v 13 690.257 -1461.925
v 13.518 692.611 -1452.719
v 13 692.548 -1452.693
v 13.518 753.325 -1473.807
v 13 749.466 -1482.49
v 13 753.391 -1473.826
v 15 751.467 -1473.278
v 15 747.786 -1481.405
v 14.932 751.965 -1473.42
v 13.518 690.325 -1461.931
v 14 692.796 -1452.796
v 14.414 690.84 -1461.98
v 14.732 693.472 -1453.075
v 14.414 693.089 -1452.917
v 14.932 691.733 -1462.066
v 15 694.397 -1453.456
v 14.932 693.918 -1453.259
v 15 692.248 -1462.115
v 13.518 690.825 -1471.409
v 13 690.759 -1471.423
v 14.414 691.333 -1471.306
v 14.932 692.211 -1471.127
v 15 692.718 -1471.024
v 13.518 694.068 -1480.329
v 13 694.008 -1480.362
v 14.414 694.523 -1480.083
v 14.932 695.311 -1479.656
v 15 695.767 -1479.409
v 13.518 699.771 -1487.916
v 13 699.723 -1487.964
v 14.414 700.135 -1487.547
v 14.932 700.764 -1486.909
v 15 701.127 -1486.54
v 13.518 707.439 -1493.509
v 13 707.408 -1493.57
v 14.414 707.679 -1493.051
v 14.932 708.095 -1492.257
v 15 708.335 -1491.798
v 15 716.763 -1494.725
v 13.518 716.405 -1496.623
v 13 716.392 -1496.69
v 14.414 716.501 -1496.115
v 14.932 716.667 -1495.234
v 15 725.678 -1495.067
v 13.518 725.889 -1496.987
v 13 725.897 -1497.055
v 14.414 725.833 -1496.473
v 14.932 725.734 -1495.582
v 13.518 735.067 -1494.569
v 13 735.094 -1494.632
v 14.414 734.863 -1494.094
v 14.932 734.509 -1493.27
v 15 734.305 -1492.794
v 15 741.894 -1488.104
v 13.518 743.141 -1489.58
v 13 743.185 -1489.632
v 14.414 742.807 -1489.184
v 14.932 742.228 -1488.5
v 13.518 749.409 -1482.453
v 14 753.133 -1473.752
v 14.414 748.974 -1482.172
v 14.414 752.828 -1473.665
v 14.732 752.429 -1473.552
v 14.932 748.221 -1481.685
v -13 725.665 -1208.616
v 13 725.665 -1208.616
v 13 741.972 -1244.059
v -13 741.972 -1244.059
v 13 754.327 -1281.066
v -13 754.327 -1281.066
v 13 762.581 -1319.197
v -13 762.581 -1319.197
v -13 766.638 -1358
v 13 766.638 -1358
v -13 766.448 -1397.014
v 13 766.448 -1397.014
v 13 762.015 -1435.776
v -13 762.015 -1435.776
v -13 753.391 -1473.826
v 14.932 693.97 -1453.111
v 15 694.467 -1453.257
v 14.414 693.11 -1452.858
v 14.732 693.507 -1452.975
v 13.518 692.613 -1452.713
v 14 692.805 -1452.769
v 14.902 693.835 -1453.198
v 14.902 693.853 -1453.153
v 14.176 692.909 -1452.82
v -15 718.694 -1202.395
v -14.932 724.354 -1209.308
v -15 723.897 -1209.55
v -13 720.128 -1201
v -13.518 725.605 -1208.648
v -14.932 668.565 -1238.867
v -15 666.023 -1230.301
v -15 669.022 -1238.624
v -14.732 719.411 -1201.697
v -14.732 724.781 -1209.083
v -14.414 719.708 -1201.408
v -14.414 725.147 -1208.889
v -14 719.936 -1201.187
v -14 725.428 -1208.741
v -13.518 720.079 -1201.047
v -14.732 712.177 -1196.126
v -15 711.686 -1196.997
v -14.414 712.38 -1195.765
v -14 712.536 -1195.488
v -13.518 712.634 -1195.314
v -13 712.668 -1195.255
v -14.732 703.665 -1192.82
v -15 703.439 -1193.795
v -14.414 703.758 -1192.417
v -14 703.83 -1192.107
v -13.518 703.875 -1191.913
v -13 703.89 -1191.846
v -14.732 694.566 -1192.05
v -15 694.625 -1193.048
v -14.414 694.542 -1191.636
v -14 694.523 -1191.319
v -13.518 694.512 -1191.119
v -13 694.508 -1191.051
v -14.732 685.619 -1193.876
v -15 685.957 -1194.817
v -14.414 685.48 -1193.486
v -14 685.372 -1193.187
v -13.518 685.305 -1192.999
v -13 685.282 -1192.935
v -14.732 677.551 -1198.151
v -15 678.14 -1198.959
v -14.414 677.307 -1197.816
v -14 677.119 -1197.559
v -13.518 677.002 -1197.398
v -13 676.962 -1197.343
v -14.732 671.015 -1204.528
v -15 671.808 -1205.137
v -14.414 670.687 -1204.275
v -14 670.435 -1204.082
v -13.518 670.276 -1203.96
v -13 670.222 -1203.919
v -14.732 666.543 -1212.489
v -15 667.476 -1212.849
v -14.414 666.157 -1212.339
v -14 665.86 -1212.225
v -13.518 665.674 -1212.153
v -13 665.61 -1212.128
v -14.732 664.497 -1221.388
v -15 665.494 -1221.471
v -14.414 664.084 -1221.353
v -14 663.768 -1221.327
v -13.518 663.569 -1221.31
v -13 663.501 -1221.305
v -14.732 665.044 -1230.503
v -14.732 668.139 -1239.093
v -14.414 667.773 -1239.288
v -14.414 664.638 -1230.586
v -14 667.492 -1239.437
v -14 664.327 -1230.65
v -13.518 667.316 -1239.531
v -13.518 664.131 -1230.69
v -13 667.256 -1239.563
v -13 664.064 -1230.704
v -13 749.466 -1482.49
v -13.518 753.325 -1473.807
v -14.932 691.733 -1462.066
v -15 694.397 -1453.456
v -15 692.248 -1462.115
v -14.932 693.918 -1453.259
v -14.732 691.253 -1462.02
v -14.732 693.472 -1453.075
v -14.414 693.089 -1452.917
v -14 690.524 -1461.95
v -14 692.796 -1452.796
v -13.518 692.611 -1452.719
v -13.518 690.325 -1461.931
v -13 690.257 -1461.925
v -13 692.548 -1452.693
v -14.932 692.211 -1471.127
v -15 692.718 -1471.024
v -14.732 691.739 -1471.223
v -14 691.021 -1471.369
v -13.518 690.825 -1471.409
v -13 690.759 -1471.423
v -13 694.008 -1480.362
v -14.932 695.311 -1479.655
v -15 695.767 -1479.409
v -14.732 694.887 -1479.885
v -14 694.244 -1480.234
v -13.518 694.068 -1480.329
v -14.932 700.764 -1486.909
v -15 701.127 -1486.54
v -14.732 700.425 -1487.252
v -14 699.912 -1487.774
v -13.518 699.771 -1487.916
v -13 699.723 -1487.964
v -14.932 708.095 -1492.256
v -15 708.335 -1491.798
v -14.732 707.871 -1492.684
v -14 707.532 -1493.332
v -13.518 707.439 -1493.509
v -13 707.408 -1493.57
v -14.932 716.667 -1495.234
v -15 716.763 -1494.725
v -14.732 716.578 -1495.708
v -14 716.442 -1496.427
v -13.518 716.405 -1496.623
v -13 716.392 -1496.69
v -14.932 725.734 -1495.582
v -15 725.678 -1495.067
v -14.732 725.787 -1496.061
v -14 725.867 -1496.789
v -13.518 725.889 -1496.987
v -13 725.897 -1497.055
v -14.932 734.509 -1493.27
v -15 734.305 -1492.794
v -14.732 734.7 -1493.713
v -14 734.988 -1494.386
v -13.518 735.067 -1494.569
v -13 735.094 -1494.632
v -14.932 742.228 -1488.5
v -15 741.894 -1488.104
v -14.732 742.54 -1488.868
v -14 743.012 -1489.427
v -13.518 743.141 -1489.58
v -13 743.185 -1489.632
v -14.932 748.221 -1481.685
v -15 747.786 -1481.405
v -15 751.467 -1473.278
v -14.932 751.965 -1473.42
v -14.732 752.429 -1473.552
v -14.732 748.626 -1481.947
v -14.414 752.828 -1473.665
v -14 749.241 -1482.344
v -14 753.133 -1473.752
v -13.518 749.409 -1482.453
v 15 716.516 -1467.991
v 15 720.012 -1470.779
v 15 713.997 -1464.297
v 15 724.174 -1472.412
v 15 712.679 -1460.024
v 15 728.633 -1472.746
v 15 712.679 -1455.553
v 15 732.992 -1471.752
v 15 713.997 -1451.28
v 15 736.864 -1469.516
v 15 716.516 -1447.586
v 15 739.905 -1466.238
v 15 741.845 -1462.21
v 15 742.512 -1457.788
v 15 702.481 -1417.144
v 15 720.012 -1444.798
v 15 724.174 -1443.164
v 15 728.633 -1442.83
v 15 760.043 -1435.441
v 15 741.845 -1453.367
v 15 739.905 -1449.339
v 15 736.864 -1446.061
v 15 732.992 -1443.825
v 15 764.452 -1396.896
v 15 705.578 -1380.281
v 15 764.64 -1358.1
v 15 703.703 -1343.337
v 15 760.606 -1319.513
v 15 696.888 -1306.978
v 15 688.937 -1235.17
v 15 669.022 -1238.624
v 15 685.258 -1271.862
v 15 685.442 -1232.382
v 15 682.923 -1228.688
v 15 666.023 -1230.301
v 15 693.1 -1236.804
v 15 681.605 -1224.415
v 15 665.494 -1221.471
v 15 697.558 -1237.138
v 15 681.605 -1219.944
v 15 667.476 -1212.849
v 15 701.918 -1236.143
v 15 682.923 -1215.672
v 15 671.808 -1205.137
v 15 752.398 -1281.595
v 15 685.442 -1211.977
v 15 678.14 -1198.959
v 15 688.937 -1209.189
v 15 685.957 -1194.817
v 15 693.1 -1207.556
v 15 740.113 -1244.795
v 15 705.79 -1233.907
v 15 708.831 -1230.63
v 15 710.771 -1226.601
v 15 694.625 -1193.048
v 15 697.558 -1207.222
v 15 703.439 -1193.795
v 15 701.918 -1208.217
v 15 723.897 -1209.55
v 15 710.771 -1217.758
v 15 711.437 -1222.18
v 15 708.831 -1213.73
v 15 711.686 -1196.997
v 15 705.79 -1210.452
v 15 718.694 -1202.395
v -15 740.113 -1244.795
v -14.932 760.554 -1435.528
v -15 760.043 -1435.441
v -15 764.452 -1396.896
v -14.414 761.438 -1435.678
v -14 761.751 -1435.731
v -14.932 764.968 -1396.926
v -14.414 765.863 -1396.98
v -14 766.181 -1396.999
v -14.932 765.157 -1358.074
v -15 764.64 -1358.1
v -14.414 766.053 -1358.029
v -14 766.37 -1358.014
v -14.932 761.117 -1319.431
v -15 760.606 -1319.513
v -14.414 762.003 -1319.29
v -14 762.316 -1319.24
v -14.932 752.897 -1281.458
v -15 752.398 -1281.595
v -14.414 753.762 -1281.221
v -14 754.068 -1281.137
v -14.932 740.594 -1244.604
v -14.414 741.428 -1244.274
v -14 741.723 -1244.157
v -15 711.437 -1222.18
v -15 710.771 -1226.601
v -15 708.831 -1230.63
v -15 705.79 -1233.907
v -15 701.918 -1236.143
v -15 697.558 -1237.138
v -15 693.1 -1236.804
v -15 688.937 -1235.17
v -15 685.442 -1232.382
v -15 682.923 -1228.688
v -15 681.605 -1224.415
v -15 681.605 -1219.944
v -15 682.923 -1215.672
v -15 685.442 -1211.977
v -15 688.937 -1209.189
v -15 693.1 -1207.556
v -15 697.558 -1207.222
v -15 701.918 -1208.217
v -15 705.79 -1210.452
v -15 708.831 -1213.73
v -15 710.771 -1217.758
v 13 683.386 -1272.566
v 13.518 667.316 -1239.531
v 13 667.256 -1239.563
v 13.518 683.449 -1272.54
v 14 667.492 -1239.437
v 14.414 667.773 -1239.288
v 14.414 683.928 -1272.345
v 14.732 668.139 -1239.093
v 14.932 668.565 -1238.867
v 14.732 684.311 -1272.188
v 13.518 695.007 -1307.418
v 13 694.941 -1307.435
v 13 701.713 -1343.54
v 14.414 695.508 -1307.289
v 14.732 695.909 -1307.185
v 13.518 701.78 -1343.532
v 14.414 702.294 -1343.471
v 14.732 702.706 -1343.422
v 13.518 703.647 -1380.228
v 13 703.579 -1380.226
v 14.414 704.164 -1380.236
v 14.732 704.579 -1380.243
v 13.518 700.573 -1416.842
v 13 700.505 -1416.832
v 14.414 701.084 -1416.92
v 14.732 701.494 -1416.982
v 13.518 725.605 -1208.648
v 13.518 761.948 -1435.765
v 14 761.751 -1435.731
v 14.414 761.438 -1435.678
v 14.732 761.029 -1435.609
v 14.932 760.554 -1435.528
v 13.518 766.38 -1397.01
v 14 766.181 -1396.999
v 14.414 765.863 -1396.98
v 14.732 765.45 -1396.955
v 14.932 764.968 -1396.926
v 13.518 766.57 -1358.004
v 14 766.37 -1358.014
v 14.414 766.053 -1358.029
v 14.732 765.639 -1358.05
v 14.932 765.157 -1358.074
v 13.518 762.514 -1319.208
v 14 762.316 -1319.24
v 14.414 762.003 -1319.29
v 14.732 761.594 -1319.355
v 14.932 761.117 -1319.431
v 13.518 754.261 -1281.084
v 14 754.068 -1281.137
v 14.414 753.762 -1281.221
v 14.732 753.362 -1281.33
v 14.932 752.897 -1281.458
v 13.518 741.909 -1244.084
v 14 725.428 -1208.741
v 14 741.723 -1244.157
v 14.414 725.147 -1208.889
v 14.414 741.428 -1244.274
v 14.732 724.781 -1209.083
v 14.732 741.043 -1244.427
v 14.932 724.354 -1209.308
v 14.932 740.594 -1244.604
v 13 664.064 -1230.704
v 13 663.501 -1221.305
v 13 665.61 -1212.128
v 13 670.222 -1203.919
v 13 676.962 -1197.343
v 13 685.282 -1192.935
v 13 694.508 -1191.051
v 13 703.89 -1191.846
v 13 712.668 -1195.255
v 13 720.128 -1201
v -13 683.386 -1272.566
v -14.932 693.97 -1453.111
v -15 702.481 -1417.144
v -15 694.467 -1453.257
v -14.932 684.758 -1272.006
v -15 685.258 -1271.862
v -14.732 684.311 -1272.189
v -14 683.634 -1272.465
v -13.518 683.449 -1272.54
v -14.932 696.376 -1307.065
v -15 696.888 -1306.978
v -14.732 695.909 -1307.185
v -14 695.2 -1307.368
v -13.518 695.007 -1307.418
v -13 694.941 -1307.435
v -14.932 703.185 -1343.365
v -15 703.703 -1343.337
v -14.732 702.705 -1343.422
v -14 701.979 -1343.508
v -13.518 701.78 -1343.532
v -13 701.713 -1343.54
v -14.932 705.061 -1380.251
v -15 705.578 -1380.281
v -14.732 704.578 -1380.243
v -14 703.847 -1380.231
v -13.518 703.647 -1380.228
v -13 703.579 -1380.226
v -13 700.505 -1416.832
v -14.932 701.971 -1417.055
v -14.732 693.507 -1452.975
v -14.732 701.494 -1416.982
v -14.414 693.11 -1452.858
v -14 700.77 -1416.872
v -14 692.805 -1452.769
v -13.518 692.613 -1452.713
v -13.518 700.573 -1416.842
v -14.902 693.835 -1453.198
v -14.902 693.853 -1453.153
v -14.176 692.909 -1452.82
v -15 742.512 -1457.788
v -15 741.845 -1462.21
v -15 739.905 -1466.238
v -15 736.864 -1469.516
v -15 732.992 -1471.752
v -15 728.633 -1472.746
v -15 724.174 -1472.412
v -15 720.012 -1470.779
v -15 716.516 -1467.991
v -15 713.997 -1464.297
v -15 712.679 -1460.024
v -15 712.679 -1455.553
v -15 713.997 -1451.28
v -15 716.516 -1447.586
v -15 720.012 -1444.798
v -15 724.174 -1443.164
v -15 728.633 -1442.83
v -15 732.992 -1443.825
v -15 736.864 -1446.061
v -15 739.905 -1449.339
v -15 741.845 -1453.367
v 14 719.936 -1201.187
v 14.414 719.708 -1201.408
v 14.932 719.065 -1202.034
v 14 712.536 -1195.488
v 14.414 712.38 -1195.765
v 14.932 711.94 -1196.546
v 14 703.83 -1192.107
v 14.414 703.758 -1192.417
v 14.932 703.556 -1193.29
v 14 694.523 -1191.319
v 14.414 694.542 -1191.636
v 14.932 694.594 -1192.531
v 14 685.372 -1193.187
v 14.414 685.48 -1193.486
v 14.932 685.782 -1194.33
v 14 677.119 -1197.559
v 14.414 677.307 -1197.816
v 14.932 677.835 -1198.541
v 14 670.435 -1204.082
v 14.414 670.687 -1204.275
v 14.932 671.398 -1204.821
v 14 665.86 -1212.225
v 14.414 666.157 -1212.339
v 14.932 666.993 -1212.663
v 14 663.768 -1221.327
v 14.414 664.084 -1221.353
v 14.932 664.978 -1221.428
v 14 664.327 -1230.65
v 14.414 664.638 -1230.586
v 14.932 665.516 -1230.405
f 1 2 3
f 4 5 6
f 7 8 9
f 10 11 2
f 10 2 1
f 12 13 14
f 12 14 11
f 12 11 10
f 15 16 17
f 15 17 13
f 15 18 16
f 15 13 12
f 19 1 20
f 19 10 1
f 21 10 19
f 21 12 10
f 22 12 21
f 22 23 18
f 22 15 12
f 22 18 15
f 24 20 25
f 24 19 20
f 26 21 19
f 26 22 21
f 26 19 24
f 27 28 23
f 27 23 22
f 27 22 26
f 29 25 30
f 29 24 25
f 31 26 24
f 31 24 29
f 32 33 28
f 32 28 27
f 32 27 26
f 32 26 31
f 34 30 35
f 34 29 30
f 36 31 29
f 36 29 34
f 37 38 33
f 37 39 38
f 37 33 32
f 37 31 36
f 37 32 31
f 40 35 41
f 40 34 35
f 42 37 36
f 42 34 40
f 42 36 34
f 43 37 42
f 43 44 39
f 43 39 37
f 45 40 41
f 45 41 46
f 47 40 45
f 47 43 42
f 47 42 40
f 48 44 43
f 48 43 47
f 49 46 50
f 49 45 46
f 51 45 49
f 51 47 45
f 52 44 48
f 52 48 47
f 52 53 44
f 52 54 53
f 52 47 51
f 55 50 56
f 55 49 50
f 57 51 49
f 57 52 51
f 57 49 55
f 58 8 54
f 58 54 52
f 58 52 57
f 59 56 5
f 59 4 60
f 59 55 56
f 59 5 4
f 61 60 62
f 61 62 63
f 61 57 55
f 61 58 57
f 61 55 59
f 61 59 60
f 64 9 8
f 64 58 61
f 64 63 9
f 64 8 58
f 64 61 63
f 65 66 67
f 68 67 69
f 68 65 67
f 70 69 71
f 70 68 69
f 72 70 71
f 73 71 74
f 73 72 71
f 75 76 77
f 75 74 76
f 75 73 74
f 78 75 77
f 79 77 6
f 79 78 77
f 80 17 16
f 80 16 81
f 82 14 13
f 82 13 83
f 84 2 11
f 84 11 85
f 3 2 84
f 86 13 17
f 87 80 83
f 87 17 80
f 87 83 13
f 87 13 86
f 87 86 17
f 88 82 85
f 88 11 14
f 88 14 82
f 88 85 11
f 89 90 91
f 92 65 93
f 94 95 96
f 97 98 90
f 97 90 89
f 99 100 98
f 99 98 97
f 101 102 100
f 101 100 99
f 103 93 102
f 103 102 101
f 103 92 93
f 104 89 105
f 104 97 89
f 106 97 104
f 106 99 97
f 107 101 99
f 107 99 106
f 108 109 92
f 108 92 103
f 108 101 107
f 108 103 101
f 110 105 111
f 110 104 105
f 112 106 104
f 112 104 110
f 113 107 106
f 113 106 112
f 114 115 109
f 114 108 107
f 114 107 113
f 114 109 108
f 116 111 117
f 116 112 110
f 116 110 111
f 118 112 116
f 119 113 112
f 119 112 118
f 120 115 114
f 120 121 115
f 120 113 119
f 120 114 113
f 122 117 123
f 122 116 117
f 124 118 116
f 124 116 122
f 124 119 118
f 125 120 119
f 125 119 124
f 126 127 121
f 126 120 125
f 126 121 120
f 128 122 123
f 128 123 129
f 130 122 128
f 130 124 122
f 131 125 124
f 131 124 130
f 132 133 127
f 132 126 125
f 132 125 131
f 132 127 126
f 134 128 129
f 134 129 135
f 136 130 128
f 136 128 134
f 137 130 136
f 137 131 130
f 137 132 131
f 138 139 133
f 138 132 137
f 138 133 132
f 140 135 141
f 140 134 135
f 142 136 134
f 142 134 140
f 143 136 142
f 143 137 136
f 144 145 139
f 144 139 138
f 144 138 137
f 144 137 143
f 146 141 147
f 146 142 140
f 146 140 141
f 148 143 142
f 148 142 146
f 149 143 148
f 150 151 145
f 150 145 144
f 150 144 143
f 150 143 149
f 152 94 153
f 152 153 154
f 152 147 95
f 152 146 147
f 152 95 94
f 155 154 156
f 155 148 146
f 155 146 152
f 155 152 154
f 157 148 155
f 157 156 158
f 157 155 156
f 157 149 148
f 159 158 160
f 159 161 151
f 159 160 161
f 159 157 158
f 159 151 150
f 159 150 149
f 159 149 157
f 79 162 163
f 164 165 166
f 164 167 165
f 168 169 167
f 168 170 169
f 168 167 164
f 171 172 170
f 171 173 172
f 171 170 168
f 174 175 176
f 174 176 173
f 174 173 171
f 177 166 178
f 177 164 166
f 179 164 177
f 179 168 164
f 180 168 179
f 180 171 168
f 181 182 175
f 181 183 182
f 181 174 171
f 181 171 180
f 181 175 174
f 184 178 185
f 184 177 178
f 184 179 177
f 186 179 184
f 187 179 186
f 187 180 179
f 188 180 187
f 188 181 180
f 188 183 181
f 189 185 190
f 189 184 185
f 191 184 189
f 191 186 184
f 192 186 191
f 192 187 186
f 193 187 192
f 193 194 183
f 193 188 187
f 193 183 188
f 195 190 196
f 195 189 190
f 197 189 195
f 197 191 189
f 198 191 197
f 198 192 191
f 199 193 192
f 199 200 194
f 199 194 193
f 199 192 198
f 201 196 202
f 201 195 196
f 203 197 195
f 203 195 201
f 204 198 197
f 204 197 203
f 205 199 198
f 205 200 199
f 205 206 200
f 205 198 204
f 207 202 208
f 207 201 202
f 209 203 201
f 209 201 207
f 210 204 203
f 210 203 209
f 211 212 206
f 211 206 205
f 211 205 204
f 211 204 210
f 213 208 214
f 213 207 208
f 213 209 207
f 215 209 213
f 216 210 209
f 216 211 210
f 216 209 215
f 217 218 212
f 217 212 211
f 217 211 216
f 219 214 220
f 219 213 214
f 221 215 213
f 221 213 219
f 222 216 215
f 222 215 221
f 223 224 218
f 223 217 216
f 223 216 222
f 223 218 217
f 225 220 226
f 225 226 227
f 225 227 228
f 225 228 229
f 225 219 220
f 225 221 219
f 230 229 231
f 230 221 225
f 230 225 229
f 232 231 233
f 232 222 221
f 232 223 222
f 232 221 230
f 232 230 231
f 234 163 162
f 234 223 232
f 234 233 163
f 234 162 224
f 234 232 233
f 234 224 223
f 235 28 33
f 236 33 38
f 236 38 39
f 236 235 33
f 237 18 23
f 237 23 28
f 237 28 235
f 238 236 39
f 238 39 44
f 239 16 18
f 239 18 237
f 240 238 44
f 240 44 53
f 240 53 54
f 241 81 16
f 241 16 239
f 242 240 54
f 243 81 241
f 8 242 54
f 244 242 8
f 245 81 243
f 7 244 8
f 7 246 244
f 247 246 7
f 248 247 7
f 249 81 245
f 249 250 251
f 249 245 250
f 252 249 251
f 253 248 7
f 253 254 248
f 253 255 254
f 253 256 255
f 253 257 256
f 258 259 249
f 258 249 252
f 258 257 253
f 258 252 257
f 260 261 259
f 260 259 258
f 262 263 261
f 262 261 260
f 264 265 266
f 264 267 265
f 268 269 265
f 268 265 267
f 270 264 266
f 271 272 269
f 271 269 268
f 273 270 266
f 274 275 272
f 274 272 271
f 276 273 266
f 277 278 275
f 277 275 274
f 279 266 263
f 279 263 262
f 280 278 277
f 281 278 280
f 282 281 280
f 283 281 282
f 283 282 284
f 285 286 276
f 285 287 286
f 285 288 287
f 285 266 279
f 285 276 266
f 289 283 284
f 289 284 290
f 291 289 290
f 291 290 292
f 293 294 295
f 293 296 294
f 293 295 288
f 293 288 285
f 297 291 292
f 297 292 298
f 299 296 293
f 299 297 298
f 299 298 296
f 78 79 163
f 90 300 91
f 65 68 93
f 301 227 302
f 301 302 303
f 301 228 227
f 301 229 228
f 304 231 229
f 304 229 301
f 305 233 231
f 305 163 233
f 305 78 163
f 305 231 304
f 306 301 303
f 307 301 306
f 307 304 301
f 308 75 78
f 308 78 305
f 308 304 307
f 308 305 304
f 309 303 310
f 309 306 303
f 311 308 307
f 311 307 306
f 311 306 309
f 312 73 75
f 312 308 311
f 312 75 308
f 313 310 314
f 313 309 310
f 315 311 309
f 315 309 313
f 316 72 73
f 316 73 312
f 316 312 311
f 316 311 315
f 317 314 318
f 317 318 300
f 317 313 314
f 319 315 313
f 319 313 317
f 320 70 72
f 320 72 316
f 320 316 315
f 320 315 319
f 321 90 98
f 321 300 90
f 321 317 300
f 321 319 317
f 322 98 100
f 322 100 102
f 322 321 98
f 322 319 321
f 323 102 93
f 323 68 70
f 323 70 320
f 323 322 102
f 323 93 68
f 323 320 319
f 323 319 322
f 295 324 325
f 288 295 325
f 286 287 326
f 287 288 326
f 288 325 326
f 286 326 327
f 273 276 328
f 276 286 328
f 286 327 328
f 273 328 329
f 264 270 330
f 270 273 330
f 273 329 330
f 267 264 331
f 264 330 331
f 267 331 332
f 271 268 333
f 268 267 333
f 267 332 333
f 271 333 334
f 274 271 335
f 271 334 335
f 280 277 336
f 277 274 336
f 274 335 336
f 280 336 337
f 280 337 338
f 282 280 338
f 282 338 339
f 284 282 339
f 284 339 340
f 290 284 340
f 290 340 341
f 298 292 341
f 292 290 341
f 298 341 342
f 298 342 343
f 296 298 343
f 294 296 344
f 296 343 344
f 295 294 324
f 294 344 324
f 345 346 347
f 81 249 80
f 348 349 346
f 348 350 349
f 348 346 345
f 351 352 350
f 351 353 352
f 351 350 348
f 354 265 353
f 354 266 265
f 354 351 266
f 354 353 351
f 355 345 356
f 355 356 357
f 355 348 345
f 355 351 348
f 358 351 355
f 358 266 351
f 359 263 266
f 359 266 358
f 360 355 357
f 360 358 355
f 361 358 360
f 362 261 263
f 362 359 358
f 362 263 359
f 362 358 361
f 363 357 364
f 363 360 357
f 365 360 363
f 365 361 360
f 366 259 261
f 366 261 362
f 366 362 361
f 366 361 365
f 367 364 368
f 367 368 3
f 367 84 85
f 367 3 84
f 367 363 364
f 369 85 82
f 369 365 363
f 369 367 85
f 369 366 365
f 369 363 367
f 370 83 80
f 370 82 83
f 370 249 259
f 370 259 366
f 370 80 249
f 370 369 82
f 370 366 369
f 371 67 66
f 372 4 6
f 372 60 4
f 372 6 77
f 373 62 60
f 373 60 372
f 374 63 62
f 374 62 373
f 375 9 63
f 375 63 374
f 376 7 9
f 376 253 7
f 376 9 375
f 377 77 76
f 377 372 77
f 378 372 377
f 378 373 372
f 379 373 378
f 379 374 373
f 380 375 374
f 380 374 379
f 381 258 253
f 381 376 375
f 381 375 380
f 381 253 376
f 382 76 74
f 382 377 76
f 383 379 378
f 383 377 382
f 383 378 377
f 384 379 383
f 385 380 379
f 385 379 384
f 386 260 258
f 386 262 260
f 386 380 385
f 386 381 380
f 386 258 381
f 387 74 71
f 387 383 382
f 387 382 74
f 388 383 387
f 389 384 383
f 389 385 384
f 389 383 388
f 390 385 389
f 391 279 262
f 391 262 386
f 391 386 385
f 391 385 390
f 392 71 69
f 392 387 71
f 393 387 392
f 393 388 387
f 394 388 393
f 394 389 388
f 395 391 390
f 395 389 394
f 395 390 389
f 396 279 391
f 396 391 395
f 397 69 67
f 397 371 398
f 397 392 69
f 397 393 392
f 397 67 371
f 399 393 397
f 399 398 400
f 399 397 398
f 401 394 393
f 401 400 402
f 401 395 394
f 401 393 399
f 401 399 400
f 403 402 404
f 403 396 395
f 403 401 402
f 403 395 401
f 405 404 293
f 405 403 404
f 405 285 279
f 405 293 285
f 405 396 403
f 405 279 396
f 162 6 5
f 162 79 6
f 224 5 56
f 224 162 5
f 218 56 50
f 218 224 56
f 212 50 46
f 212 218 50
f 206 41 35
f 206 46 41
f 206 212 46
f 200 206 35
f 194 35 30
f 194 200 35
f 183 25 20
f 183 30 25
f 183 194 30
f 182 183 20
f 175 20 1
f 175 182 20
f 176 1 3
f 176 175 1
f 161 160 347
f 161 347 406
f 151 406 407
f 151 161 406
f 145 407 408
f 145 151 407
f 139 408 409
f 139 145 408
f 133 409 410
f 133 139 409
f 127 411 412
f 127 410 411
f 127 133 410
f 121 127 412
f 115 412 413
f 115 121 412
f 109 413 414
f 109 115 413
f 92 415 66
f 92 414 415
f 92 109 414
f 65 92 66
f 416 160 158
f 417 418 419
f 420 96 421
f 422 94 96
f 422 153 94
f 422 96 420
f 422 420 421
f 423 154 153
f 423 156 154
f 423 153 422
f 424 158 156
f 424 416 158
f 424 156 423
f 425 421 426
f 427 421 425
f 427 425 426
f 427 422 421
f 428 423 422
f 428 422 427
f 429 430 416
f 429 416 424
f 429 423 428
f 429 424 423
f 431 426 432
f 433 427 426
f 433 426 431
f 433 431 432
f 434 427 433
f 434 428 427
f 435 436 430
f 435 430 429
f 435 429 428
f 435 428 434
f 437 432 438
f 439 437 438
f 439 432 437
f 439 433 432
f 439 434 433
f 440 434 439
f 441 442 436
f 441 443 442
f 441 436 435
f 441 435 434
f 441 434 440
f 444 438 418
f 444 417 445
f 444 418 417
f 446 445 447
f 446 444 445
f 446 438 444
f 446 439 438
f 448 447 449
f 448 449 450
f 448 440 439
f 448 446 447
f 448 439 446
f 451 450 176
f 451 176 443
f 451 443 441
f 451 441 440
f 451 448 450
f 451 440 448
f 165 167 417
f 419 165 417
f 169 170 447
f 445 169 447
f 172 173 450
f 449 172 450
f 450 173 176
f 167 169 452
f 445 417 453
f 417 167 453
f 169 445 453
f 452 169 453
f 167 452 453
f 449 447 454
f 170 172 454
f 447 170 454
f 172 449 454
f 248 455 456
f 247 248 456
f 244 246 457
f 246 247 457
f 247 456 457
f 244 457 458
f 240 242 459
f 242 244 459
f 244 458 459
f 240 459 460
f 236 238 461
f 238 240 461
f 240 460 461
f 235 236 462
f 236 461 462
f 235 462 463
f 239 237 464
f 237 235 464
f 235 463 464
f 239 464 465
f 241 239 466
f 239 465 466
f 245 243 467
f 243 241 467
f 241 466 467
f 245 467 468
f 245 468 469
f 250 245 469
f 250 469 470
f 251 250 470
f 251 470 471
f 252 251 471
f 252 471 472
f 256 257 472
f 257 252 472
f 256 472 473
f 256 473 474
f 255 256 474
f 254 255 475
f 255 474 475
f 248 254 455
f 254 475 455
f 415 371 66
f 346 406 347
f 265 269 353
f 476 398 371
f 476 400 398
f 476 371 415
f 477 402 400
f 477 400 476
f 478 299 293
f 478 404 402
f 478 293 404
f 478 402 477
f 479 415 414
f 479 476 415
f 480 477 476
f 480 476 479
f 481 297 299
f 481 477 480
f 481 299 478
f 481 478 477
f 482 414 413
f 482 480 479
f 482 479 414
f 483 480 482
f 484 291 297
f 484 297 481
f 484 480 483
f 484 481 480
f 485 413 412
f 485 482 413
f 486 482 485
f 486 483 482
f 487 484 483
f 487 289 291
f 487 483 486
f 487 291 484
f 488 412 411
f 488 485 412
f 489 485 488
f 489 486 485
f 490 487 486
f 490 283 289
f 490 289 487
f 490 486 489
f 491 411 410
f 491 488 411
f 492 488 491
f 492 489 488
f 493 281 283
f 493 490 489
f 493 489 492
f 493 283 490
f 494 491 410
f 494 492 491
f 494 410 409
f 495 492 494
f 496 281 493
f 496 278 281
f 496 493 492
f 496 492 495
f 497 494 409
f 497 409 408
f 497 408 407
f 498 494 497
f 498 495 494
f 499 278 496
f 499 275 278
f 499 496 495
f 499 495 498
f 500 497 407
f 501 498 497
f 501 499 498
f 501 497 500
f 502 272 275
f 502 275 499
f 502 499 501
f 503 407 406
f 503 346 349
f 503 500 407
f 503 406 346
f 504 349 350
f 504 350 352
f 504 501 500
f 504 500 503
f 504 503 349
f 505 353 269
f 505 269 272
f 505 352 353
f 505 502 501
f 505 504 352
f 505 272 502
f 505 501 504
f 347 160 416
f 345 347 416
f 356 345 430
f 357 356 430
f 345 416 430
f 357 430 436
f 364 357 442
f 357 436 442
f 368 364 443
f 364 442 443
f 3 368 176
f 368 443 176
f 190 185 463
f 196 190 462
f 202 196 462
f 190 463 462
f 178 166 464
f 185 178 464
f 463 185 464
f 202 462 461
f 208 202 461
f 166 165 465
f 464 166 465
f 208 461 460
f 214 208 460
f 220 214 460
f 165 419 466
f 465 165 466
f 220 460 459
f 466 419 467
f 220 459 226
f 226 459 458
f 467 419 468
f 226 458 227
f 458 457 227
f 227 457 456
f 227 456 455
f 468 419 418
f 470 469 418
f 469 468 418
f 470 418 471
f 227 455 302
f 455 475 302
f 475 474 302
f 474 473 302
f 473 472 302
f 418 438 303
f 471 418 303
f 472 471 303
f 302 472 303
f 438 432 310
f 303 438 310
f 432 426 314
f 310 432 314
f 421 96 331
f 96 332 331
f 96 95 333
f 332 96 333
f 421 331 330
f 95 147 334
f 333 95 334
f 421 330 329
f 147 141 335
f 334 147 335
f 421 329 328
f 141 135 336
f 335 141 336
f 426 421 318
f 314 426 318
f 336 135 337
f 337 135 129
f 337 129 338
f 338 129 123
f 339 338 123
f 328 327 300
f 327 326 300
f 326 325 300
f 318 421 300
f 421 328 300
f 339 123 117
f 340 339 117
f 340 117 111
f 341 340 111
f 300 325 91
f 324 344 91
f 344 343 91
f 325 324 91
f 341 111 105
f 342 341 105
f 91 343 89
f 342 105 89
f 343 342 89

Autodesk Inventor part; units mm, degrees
ref_plane "YZ Plane" through (0, 0, 0) normal (1, 0, 0) x (0, 1, 0)
ref_plane "XZ Plane" through (0, 0, 0) normal (0, 1, 0) x (-1, 0, 0)
ref_plane "XY Plane" through (0, 0, 0) normal (0, 0, 1) x (1, 0, 0)
sketch "Sketch1" plane through (0, 0, 0) normal (1, 0, 0) x (0, 1, 0)
  line L0 (2812.3869, 0) -> (2812.3869, -5171.1623) construction
  line L1 (2812.3869, -5171.1623) -> (0, -5171.1623) construction
  line L2 (0, -5171.1623) -> (0, 0) construction
  line L3 (0, 0) -> (2812.3869, 0) construction
  point P0 (0, 0)
sketch "Sketch2" plane through (0, 0, 0) normal (1, 0, 0) x (0, 1, 0)
  arc A0 (753.391, -1473.8258) -> (725.6652, -1208.6158) centre (409.0296, -1375.7721) ccw
  arc A1 (692.5478, -1452.6934) -> (667.2559, -1239.5627) centre (430.475, -1375.7271) ccw
  arc A2 (725.6652, -1208.6158) -> (667.2559, -1239.5627) centre (696.4374, -1224.0456) ccw
  arc A3 (692.5478, -1452.6934) -> (753.391, -1473.8258) centre (722.3676, -1464.9922) ccw
  circle A4 centre (696.4374, -1222.1798) radius 15
  circle A5 centre (727.5117, -1457.7884) radius 15
  point P0 (0, 0)
  dimension "d4" = 30
  dimension "d5" = 30
extrude "Extrusion1" add sketch "Sketch2" along normal mid plane 30
fillet "Fillet1" radius 2 8 edges at (15, 765.1382, -1338.5435) (15, 680.964, -1194.8409) (15, 701.7128, -1343.5398) (15, 711.7843, -1495.4631) (-15, 765.1382, -1338.5435) (-15, 711.7843, -1495.4631) (-15, 701.7128, -1343.5398) (-15, 680.964, -1194.8409)
properties part number "Lankarm_kort"
